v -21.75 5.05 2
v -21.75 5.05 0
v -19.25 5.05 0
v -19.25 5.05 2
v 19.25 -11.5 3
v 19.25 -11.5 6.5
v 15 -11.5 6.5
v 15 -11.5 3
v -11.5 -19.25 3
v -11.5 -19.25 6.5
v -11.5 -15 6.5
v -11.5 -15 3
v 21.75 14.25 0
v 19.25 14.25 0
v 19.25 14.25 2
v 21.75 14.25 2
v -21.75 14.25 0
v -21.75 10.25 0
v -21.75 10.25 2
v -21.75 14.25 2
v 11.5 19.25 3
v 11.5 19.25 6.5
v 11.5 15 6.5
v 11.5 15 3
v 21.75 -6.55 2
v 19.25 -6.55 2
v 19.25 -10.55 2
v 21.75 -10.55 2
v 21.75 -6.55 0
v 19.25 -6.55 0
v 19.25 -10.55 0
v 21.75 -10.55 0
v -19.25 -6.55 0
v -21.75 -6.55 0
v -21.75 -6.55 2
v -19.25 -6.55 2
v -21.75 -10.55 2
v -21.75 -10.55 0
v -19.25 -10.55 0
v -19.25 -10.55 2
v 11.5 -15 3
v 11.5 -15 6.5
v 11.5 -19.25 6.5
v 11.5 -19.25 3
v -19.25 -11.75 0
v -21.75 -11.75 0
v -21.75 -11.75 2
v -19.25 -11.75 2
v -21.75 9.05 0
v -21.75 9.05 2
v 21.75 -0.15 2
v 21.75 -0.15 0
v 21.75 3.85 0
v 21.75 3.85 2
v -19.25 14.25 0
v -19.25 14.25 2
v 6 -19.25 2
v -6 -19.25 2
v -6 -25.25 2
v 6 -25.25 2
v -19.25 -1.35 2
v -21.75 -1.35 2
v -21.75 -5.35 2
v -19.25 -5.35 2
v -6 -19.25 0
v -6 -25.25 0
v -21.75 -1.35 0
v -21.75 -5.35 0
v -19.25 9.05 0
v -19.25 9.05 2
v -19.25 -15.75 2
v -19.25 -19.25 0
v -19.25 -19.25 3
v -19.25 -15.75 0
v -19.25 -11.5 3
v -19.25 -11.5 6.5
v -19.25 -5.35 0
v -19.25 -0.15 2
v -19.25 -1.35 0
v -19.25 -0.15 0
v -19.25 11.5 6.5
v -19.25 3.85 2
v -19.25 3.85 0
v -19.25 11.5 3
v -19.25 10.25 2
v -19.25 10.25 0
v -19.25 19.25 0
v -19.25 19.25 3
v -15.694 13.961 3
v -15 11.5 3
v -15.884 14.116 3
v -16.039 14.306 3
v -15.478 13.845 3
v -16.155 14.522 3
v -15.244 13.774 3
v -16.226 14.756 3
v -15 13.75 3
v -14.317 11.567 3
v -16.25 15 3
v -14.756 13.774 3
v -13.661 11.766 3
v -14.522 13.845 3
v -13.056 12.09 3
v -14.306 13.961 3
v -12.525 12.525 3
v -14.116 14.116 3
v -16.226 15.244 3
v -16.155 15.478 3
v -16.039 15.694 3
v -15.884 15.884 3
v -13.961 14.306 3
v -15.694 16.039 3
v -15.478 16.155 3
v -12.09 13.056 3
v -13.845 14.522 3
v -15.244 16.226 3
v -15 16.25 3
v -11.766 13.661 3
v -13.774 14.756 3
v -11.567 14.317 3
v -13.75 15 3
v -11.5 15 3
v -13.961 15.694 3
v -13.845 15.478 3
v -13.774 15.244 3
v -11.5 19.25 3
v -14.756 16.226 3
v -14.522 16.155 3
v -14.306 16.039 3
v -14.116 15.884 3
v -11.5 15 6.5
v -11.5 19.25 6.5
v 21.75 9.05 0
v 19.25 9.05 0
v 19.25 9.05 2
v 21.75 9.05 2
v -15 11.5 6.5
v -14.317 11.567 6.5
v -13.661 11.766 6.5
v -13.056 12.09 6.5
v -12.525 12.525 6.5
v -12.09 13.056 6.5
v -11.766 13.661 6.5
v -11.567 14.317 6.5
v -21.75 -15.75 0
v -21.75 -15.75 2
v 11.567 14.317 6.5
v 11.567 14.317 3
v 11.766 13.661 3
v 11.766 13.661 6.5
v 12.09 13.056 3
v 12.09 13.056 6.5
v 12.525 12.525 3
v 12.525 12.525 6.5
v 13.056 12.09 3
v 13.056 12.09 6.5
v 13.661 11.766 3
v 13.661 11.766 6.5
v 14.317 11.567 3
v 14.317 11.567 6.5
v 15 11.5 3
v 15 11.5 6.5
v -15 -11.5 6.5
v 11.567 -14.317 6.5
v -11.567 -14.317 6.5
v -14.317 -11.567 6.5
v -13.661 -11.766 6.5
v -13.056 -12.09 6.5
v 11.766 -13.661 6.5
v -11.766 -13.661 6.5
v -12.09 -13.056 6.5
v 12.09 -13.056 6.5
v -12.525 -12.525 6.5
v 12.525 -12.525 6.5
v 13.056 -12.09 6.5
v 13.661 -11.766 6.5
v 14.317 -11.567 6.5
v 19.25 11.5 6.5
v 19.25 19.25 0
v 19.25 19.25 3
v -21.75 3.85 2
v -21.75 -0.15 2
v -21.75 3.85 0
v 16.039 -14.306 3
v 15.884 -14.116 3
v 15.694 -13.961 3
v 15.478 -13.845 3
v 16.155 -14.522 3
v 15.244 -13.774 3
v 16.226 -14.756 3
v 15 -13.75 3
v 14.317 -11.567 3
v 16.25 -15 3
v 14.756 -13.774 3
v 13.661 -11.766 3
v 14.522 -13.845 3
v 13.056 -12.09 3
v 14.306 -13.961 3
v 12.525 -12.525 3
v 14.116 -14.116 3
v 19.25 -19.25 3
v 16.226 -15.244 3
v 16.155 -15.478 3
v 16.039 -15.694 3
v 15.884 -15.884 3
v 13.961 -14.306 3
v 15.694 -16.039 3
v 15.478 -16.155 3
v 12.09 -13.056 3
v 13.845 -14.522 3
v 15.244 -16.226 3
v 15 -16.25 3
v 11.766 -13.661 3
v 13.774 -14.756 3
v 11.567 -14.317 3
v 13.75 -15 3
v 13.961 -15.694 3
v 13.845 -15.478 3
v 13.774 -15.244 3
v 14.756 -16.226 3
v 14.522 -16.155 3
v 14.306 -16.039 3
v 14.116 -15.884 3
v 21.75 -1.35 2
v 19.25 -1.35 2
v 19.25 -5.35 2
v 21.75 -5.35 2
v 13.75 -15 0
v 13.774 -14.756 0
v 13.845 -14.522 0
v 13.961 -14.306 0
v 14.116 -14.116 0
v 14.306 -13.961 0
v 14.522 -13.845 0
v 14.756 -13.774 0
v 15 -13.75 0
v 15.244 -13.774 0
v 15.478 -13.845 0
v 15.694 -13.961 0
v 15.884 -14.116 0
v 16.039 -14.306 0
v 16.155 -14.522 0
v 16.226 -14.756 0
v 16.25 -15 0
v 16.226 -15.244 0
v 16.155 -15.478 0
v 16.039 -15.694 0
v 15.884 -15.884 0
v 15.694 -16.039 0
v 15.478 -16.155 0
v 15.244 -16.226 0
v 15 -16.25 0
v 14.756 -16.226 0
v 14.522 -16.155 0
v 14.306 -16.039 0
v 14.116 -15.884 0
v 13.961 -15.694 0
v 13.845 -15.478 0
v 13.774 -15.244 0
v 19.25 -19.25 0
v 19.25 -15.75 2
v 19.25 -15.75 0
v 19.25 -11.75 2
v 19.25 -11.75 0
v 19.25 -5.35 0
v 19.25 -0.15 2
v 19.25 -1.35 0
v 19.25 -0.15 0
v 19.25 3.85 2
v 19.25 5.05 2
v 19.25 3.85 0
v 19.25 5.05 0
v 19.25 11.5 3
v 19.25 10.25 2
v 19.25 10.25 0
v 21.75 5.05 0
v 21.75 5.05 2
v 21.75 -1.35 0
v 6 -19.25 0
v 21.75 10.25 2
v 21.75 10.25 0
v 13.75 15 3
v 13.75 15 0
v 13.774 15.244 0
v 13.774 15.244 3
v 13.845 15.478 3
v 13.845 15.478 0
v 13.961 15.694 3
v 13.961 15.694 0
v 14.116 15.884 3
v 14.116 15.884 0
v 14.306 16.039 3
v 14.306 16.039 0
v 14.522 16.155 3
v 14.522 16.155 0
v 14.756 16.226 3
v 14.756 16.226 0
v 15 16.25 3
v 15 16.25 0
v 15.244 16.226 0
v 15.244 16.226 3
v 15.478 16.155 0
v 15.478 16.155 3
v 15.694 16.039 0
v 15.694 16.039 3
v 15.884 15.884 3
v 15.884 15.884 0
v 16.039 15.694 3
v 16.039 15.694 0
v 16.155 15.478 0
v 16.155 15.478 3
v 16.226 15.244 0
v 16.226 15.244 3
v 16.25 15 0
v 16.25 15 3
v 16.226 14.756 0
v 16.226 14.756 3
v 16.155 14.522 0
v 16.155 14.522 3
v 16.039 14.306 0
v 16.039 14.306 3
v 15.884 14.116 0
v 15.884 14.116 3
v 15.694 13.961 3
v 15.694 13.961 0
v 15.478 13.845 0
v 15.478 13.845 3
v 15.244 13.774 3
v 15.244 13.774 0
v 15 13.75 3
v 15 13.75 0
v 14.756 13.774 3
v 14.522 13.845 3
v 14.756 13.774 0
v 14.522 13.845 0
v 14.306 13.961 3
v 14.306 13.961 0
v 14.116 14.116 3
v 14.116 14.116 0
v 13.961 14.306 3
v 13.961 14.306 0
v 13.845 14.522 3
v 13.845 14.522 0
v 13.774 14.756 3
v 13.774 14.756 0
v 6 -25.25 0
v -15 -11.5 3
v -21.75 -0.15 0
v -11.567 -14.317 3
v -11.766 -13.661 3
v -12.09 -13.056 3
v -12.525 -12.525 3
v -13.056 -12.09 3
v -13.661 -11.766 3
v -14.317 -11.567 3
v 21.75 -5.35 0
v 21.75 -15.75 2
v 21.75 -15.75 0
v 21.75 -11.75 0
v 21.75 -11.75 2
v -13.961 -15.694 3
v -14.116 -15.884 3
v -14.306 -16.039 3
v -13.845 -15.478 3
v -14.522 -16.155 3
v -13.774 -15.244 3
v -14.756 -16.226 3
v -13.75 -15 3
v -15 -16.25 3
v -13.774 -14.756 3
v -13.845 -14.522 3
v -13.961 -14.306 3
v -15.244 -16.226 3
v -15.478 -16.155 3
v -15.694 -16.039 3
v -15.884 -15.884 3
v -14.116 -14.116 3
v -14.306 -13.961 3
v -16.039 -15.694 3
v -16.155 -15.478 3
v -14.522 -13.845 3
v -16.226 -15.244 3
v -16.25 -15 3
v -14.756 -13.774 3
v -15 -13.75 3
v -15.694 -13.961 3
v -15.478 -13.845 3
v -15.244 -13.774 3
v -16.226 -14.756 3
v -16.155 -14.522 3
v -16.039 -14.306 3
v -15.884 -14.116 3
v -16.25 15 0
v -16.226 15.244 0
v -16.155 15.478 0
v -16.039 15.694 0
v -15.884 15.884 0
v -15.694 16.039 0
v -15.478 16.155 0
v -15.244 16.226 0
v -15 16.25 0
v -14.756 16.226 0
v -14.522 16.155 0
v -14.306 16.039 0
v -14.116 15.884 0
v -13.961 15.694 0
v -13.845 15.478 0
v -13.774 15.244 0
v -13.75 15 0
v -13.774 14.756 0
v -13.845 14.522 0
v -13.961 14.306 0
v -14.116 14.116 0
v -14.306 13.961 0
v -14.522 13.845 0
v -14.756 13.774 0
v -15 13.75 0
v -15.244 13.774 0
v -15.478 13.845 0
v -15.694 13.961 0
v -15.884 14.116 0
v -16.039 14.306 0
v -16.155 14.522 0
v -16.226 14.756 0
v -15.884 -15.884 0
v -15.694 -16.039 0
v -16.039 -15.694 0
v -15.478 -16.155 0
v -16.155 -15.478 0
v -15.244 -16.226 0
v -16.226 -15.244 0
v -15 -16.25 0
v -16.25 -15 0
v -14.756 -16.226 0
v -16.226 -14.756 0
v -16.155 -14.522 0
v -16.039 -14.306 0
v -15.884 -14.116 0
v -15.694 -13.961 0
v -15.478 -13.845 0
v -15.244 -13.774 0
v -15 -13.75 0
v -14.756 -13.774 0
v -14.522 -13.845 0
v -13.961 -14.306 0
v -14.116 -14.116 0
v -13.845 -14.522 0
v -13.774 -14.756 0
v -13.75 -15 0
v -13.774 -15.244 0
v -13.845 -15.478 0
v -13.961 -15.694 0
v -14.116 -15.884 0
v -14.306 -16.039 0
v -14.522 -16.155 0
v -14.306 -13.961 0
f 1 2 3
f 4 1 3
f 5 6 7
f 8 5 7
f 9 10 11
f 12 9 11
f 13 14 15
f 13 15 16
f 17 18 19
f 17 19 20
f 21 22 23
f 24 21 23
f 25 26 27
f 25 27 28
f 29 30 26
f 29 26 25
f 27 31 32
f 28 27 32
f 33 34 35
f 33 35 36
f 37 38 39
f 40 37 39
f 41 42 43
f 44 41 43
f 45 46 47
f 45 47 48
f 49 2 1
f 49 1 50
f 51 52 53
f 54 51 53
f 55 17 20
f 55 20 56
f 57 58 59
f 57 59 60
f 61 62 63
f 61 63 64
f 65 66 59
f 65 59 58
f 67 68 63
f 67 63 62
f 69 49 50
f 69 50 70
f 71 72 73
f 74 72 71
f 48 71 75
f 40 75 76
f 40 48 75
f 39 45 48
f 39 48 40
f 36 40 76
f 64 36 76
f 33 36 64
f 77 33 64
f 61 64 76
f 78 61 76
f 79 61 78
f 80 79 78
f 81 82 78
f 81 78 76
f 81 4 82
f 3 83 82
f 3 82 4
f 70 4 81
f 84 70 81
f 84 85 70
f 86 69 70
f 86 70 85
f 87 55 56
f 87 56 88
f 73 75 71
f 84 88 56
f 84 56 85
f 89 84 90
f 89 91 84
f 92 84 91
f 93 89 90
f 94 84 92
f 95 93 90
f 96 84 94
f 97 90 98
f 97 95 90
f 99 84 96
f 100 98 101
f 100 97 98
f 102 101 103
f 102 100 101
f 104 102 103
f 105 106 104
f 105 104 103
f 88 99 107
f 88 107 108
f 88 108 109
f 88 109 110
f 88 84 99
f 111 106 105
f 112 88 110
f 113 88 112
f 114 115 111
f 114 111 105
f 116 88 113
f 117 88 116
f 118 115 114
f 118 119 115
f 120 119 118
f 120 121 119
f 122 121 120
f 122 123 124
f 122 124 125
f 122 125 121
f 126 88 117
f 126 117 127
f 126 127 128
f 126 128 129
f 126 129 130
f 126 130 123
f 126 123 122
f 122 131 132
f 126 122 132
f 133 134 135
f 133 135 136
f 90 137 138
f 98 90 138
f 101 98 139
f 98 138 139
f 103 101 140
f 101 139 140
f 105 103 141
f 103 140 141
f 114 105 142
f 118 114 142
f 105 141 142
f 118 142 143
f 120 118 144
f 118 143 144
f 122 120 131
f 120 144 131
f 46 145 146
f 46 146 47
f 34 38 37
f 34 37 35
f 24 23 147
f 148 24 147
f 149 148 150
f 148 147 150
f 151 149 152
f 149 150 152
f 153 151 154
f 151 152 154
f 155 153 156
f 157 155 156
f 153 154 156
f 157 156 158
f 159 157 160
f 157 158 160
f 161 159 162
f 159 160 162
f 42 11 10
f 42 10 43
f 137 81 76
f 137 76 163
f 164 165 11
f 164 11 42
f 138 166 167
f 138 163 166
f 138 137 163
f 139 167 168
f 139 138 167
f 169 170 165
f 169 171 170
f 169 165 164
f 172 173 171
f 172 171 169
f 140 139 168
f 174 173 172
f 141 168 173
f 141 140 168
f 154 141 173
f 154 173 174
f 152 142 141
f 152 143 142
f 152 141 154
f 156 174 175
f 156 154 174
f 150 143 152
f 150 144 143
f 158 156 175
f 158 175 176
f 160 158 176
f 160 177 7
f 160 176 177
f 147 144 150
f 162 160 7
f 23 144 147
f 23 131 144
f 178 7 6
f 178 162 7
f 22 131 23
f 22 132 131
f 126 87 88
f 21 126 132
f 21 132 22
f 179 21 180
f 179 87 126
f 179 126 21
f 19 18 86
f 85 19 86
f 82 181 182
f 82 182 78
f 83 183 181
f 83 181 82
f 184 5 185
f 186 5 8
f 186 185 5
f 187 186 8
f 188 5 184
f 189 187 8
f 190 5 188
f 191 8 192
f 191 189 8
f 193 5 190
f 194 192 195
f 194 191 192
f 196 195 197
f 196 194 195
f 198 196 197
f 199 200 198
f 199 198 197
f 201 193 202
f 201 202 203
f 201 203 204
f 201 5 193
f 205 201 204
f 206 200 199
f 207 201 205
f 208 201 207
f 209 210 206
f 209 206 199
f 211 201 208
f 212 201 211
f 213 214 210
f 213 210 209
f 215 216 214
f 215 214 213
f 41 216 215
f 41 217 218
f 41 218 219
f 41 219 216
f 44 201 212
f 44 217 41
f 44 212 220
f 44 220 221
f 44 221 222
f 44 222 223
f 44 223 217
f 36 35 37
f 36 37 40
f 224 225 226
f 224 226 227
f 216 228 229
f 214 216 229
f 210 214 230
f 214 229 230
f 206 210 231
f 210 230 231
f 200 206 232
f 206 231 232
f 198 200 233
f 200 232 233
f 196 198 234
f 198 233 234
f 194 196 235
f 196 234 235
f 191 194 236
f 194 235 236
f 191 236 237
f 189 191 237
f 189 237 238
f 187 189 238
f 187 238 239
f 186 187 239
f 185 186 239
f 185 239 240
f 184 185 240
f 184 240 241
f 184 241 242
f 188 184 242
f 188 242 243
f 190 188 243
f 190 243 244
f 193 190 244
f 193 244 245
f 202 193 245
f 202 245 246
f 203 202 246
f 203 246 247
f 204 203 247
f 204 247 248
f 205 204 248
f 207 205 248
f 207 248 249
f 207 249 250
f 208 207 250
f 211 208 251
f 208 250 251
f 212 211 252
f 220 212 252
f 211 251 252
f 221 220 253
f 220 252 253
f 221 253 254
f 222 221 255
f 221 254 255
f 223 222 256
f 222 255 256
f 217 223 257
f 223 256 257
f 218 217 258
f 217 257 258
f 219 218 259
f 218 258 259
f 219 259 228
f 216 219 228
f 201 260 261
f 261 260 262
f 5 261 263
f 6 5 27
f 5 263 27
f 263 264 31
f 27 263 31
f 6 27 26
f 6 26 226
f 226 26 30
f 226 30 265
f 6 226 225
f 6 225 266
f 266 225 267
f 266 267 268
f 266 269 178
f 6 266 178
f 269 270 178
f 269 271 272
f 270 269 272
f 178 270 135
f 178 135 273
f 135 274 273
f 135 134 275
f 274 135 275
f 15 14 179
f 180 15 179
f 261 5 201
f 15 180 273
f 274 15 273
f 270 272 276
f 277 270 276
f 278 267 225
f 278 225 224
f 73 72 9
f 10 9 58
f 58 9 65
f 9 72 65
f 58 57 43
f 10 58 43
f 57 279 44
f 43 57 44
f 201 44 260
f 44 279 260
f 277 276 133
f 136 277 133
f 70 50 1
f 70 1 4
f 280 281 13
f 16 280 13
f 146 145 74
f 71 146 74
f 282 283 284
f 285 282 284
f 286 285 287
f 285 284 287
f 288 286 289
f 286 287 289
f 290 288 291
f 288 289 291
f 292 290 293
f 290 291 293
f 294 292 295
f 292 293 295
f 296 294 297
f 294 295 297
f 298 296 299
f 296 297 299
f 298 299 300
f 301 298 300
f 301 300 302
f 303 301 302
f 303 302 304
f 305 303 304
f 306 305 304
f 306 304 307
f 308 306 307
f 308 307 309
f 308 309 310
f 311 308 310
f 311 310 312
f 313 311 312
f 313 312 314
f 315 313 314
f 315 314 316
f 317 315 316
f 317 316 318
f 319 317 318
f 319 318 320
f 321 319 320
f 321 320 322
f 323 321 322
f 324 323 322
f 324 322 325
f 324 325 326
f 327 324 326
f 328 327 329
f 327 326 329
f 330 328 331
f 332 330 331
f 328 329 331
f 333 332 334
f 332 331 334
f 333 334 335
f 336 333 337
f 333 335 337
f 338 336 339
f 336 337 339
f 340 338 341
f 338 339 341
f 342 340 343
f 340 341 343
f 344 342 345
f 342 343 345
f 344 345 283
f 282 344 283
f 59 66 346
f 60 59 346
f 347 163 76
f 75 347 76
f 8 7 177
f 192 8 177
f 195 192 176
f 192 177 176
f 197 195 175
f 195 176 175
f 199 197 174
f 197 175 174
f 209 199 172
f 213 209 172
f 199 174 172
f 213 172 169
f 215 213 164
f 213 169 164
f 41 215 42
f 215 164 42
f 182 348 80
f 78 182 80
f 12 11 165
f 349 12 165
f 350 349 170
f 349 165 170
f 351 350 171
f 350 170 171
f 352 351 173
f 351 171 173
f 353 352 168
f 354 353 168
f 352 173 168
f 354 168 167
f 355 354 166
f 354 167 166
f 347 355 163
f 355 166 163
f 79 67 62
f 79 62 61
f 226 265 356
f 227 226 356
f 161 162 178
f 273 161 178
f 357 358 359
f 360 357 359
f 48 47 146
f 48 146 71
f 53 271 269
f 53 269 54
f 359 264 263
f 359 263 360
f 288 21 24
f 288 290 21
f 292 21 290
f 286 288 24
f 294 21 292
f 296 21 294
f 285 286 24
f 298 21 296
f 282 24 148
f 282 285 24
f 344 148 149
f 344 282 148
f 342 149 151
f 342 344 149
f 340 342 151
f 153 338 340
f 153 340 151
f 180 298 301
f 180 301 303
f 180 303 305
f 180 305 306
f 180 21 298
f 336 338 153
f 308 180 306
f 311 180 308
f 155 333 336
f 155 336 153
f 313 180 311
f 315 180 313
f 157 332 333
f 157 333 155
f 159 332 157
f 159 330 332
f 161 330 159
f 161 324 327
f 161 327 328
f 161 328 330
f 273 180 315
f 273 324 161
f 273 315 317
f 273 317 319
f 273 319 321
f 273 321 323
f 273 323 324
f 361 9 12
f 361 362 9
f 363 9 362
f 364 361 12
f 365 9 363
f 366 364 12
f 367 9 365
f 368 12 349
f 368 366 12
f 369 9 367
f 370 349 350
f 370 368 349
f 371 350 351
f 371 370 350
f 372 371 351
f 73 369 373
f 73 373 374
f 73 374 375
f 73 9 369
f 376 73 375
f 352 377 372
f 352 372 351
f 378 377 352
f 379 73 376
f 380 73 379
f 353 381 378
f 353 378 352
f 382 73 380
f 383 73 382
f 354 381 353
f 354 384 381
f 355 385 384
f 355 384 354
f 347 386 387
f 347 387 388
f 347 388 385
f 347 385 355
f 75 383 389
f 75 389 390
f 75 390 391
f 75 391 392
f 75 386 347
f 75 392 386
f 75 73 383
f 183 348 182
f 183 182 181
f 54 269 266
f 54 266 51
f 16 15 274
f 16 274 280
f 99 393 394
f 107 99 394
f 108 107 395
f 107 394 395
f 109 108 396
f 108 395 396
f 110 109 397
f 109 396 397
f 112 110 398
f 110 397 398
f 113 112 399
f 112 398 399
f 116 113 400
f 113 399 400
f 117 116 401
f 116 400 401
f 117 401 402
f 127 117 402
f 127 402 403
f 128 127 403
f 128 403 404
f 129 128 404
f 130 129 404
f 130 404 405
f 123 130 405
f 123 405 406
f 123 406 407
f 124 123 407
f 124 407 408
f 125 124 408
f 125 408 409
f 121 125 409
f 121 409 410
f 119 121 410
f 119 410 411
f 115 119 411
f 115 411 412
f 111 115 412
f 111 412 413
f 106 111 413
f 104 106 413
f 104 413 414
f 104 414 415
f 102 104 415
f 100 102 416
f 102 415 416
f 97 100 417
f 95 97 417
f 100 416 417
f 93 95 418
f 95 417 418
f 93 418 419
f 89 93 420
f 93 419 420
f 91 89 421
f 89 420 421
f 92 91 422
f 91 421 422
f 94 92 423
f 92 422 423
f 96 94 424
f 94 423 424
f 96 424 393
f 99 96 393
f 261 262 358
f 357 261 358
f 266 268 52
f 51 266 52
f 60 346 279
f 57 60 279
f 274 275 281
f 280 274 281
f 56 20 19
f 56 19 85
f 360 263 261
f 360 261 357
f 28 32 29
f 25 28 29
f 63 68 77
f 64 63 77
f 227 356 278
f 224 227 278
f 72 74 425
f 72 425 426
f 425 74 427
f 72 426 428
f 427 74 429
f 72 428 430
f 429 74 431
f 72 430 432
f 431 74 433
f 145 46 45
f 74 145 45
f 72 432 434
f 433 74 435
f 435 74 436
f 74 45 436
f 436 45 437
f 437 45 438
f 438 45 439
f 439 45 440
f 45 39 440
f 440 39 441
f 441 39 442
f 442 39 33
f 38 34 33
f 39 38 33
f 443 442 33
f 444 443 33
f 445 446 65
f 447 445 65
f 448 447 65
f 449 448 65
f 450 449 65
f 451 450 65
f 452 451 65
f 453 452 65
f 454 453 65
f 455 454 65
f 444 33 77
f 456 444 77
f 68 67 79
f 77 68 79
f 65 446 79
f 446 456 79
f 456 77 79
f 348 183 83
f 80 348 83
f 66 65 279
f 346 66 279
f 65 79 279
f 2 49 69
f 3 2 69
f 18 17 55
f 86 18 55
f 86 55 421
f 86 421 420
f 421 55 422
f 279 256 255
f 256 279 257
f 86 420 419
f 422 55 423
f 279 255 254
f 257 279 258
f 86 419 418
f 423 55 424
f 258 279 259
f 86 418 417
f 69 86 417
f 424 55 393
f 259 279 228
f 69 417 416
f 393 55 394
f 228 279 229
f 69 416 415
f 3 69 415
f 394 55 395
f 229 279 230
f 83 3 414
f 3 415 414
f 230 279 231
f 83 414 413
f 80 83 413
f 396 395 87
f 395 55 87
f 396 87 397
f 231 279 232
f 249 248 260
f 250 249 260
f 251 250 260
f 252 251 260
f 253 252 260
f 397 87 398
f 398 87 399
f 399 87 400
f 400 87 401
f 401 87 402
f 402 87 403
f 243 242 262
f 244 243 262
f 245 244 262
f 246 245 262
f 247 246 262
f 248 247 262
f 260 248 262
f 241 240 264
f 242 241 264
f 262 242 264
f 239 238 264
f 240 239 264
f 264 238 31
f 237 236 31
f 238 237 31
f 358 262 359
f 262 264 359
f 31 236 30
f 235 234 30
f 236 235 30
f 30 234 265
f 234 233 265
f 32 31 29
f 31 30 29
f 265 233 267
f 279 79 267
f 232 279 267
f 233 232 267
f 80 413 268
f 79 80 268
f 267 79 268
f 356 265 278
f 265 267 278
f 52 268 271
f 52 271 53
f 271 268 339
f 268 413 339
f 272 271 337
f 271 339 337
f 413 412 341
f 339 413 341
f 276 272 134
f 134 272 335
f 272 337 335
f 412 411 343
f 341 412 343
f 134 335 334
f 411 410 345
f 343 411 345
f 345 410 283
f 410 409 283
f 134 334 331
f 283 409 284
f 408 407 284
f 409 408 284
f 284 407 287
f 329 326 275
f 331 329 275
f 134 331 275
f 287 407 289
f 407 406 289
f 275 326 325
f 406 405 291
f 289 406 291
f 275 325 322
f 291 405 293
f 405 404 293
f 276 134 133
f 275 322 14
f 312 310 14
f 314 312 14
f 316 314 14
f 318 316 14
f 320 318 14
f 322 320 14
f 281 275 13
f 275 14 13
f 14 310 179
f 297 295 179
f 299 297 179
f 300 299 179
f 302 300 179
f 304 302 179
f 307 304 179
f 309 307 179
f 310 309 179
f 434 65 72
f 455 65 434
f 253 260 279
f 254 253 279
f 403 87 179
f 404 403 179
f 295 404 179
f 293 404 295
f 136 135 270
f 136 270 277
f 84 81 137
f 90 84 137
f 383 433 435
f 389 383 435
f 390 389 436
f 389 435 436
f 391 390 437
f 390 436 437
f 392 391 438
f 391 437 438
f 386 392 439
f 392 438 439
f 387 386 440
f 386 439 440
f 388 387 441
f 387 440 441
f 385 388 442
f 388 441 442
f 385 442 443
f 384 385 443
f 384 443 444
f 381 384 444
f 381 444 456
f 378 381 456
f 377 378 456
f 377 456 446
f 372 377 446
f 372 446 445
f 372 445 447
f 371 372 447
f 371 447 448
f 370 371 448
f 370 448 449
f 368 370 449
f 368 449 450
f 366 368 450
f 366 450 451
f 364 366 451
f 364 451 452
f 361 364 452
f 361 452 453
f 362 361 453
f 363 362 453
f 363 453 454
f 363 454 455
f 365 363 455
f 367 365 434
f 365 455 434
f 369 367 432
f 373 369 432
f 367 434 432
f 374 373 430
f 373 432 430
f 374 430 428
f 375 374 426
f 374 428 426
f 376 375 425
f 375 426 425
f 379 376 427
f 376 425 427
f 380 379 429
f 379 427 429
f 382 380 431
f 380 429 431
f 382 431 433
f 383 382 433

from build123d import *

# Parameters (mm, degrees)
SKETCH_1_W               = 38.5
SKETCH_1_H               = 38.5
EXTRUDE_1_DEPTH          = 6.5
SKETCH_2_W               = 2.5
SKETCH_2_H               = 4
SKETCH_2_W_2             = 6
SKETCH_2_H_2             = 6
EXTRUDE_2_DEPTH          = 2
M3X0_5_1_D               = 2.5
M3X0_5_1_DEPTH           = 7.748924226
M3X0_5_1_TIP             = 0.751075774
CUT_EXTRUDE_1_DEPTH      = 3.5
PATTERN_CIRCULAR_1_COUNT = 4


with BuildPart() as part:
    # ｽｹｯﾁ1 → ﾎﾞｽ - 押し出し1 (new body)
    with BuildSketch(Plane.XY):
        Rectangle(SKETCH_1_W, SKETCH_1_H)
    extrude(amount=EXTRUDE_1_DEPTH)

    # ｽｹｯﾁ2 → ﾎﾞｽ - 押し出し2 (add)
    with BuildSketch(Plane.XY):
        with Locations((-20.5, 12.25)):
            Rectangle(SKETCH_2_W, SKETCH_2_H)
        with Locations((-20.5, 7.05)):
            Rectangle(SKETCH_2_W, SKETCH_2_H)
        with Locations((-20.5, 1.85)):
            Rectangle(SKETCH_2_W, SKETCH_2_H)
        with Locations((-20.5, -3.35)):
            Rectangle(SKETCH_2_W, SKETCH_2_H)
        with Locations((-20.5, -8.55)):
            Rectangle(SKETCH_2_W, SKETCH_2_H)
        with Locations((-20.5, -13.75)):
            Rectangle(SKETCH_2_W, SKETCH_2_H)
        with Locations((-3, -22.25)):
            Rectangle(SKETCH_2_W_2, SKETCH_2_H_2)
        with Locations((3, -22.25)):
            Rectangle(SKETCH_2_W_2, SKETCH_2_H_2)
        with Locations((20.5, -13.75)):
            Rectangle(SKETCH_2_W, SKETCH_2_H)
        with Locations((20.5, -8.55)):
            Rectangle(SKETCH_2_W, SKETCH_2_H)
        with Locations((20.5, 1.85)):
            Rectangle(SKETCH_2_W, SKETCH_2_H)
        with Locations((20.5, 7.05)):
            Rectangle(SKETCH_2_W, SKETCH_2_H)
        with Locations((20.5, 12.25)):
            Rectangle(SKETCH_2_W, SKETCH_2_H)
        with Locations((20.5, -3.35)):
            Rectangle(SKETCH_2_W, SKETCH_2_H)
    extrude(amount=EXTRUDE_2_DEPTH)

    # M3x0.5 ねじ穴1
    with Locations(Plane.XY.offset(6.5)):
        with Locations((-15, 15), (15, 15), (15, -15), (-15, -15)):
            Hole(M3X0_5_1_D / 2, depth=M3X0_5_1_DEPTH)
            with Locations((0, 0, -(M3X0_5_1_DEPTH + M3X0_5_1_TIP / 2))):  # 118° drill point
                Cone(0, M3X0_5_1_D / 2, M3X0_5_1_TIP, mode=Mode.SUBTRACT)

    # ｽｹｯﾁ5 → ｶｯﾄ - 押し出し1 (cut)
    with BuildSketch(Plane.XY.offset(6.5)):
        with BuildLine():
            Line((-11.5, 15), (-11.5, 19.25))
            Line((-11.5, 19.25), (-19.25, 19.25))
            Line((-19.25, 19.25), (-19.25, 11.5))
            Line((-19.25, 11.5), (-15, 11.5))
            ThreePointArc((-15, 11.5), (-12.525126266, 12.525126266), (-11.5, 15))
        make_face()
    cut_extrude_1 = extrude(amount=-CUT_EXTRUDE_1_DEPTH, mode=Mode.SUBTRACT)

    # 円形ﾊﾟﾀｰﾝ1: ｶｯﾄ - 押し出し1 ×4 about axis
    pattern_circular_1_axis = Axis((0, 0, 0), (0, 0, 1))
    for i in range(1, PATTERN_CIRCULAR_1_COUNT):
        add(cut_extrude_1.rotate(pattern_circular_1_axis, i * 360 / PATTERN_CIRCULAR_1_COUNT), mode=Mode.SUBTRACT)


solid = part.part
